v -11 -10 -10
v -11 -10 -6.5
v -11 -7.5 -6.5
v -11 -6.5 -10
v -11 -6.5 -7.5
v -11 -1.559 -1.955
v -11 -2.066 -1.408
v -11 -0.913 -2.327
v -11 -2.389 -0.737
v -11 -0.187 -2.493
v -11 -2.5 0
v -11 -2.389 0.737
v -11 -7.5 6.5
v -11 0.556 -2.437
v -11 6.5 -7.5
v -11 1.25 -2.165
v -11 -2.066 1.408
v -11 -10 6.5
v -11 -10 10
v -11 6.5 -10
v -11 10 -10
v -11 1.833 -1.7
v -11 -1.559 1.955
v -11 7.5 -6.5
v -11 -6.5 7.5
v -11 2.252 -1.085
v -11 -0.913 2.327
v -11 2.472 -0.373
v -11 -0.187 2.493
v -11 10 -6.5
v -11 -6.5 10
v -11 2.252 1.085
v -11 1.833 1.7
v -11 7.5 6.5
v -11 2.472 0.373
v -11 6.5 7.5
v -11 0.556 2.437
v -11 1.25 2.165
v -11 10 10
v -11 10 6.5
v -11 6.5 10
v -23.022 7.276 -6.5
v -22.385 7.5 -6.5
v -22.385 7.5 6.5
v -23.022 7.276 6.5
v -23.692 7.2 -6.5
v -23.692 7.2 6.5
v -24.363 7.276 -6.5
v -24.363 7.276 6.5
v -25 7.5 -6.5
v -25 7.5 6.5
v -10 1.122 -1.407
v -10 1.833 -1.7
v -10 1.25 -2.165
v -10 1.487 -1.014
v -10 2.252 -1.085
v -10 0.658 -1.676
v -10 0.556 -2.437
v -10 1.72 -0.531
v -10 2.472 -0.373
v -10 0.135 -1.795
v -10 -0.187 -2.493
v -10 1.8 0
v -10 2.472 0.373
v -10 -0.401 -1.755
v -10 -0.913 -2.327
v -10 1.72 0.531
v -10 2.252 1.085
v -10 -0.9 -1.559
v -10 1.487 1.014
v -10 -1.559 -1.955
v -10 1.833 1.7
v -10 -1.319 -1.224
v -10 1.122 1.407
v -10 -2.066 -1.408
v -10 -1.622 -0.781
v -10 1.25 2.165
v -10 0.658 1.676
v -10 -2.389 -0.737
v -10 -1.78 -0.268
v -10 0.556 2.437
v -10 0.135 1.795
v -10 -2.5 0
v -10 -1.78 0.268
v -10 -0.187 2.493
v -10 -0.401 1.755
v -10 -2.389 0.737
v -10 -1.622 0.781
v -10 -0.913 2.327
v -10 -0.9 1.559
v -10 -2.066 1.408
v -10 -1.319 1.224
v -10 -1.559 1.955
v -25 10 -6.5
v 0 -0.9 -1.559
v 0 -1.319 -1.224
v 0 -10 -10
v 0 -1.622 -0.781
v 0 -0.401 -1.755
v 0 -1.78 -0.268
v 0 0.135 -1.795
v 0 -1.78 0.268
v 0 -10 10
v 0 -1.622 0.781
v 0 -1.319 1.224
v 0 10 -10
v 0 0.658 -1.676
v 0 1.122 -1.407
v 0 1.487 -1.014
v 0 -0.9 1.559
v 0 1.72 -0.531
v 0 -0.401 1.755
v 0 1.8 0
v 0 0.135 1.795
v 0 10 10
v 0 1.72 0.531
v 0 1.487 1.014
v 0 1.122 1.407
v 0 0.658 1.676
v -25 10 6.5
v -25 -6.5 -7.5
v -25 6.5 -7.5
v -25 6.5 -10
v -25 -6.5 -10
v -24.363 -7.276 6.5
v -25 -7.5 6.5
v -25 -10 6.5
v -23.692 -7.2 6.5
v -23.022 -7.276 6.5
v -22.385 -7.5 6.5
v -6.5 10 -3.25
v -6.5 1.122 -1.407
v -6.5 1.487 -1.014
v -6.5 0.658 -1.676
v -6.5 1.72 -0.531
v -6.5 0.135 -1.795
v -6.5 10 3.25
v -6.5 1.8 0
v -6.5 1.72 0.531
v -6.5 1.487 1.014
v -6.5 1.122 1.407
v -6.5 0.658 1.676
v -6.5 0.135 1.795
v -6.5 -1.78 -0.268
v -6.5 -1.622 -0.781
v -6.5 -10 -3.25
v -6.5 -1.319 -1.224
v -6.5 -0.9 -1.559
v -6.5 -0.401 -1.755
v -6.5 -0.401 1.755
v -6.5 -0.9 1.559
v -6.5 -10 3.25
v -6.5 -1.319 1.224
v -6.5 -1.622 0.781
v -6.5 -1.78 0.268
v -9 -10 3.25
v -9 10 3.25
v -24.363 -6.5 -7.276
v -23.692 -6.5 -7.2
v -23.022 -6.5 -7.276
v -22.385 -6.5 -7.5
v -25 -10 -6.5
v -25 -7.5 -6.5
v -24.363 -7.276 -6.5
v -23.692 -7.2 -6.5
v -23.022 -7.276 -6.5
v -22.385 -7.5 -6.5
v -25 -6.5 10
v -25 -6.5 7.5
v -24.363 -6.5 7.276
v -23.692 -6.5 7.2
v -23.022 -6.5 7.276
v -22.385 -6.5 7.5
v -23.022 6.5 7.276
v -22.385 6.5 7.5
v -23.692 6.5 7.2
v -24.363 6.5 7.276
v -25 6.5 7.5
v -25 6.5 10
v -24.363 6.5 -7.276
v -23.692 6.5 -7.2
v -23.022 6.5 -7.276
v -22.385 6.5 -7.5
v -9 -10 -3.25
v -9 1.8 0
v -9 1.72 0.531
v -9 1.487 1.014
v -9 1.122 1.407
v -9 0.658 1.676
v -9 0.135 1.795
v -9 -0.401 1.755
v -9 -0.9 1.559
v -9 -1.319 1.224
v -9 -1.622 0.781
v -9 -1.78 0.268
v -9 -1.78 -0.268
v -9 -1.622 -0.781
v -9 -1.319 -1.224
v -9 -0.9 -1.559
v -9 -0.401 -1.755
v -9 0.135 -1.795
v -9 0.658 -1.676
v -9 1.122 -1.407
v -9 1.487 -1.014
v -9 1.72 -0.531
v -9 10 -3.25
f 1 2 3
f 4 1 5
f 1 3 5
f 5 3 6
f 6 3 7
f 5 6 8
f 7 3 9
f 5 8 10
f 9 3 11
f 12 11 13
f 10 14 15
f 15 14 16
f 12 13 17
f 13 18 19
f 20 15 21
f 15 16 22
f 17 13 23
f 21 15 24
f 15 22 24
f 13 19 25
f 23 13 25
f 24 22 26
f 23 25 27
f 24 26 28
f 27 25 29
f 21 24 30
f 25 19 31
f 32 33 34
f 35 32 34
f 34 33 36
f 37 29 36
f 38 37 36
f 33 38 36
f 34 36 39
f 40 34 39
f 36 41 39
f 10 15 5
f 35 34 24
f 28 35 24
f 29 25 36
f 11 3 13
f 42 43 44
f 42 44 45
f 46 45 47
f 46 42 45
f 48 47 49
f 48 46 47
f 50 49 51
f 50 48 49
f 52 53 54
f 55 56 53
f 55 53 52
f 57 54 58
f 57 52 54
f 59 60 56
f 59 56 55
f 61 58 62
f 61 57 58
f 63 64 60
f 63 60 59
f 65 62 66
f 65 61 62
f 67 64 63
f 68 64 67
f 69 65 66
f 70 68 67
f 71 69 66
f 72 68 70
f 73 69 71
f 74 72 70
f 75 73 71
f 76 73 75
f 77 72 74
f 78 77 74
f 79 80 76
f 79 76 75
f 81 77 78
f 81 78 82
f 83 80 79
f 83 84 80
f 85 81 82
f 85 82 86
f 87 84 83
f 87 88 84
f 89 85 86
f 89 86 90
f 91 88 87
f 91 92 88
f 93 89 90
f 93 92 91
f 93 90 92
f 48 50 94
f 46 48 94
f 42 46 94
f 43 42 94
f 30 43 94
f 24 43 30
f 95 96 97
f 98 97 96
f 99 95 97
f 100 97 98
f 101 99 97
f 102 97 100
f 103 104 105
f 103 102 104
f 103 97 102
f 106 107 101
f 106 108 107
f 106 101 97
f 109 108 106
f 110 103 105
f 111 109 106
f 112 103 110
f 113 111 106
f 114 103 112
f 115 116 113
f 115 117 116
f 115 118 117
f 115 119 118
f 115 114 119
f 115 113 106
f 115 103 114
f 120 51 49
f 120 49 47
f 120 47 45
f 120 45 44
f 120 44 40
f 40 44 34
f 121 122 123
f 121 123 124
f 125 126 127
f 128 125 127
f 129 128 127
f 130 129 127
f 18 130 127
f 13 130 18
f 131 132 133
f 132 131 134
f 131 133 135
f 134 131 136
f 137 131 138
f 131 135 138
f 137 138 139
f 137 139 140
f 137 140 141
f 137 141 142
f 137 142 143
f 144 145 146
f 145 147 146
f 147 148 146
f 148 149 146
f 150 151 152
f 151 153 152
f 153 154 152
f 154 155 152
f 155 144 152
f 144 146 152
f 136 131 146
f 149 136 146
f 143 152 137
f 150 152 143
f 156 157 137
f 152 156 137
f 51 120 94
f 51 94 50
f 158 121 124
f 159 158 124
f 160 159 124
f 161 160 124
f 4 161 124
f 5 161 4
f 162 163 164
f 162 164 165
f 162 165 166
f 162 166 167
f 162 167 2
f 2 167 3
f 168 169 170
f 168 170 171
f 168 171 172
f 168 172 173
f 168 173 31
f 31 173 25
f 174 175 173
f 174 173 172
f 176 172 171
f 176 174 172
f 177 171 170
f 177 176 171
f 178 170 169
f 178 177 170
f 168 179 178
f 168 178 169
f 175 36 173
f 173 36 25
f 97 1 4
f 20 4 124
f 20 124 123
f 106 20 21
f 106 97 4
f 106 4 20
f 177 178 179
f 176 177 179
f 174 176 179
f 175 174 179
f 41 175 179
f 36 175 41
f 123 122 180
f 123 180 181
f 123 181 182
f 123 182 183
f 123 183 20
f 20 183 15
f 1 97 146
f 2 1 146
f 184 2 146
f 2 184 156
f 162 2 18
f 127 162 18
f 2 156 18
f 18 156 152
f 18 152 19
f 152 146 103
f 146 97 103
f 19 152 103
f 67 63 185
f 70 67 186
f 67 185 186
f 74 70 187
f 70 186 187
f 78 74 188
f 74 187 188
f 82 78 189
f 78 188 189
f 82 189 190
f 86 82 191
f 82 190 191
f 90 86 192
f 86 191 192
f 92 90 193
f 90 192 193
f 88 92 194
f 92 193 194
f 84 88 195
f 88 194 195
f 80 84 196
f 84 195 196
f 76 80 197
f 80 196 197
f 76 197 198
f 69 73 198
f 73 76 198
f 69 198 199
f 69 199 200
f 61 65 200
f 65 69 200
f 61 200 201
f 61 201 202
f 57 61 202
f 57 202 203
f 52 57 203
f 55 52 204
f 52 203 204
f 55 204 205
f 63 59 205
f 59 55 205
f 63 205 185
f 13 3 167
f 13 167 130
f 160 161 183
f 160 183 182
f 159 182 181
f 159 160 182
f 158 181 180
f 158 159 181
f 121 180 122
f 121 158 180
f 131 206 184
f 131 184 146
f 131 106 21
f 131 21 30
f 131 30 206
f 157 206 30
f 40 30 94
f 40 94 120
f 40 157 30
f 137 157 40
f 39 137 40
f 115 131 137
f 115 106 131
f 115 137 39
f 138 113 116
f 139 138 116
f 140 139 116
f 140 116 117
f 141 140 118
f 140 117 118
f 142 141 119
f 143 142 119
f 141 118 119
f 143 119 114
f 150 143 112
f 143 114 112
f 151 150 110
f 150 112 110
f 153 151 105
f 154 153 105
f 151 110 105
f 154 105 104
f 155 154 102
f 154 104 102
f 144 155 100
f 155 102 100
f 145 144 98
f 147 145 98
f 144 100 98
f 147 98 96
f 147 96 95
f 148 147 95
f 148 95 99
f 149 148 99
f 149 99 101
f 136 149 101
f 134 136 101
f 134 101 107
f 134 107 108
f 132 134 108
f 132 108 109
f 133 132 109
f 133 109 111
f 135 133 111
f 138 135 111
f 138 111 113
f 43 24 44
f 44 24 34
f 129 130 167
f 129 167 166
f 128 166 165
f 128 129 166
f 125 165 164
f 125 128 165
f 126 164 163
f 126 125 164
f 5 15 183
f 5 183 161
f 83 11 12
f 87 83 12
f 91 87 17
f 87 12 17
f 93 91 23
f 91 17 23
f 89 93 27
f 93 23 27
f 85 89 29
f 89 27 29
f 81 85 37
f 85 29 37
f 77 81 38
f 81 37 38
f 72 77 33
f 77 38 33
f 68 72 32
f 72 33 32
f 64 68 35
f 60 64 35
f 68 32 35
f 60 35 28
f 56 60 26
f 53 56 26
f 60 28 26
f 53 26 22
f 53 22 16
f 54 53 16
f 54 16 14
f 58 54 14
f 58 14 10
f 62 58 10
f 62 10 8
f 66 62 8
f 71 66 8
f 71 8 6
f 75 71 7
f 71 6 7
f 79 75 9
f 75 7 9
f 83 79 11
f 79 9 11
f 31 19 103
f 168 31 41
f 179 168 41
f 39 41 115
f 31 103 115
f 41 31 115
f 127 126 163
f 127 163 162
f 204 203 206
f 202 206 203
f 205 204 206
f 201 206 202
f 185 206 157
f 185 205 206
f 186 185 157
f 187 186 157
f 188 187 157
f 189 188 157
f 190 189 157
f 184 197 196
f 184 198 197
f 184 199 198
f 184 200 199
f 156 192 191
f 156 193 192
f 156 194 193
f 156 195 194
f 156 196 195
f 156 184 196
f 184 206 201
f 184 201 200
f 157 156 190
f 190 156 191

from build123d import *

# Parameters (mm, degrees)
F0_W            = 20
F0_H            = 20
F0_R            = 1.8
F1_DEPTH        = 11
F2_W            = 13
F2_H            = 2.5
F2_W_2          = 2.5
F2_H_2          = 13
F3_DEPTH        = 14
F2_R            = 2.5
F2_R_2          = 1.8
F4_DEPTH        = 1
F5_W            = 2.5
F5_H            = 6.5
F6_DEPTH        = 25
F8_DEPTH        = 13
F8_COPIES_COUNT = 4


# Not quite as in the source:
# - a pattern or mirror of a feature is missing from the dataset's text; its kind, count and spacing are read off the source's solid


with BuildPart() as f1:
    # F0 (on Right) → F1 (new body)
    with BuildSketch(Plane.YZ):
        Rectangle(F0_W, F0_H)
        Circle(F0_R, mode=Mode.SUBTRACT)
    extrude(amount=-F1_DEPTH)

    # F2 (on face) → F3 (join)
    with BuildSketch(Plane(origin=(-11, 0, 0), x_dir=(0, -1, 0), z_dir=(-1, 0, 0))):
        with Locations((0, -8.75)):
            Rectangle(F2_W, F2_H)
        with Locations((8.75, 0)):
            Rectangle(F2_W_2, F2_H_2)
        with Locations((-8.75, 0)):
            Rectangle(F2_W_2, F2_H_2)
        with Locations((0, 8.75)):
            Rectangle(F2_W, F2_H)
    extrude(amount=F3_DEPTH)

    # F2 (on face) → F4 (cut)
    with BuildSketch(Plane(origin=(-11, 0, 0), x_dir=(0, -1, 0), z_dir=(-1, 0, 0))):
        Circle(F2_R)
        Circle(F2_R_2, mode=Mode.SUBTRACT)
    extrude(amount=-F4_DEPTH, mode=Mode.SUBTRACT)

    # F5 (on face) → F6 (cut)
    with BuildSketch(Plane.XZ.offset(10)):
        with Locations((-7.75, 0)):
            Rectangle(F5_W, F5_H)
    extrude(amount=-F6_DEPTH, mode=Mode.SUBTRACT)

    # F7 (on face) → F8 (join, through all)
    with BuildSketch(Plane.XZ.offset(6.5)):
        with BuildLine():
            Line((-25, -7.5), (-22.3846606339, -7.5))
            ThreePointArc((-22.3846606339, -7.5), (-23.6923303169, -7.2), (-25, -7.5))
        make_face()
    f8 = extrude(amount=-F8_DEPTH)

    # F8_copies: F8 ×4 about axis
    f8_copies_axis = Axis((0, 0, 0), (1, 0, 0))
    for i in range(1, F8_COPIES_COUNT):
        add(f8.rotate(f8_copies_axis, i * 360 / F8_COPIES_COUNT))


solid = f1.part
